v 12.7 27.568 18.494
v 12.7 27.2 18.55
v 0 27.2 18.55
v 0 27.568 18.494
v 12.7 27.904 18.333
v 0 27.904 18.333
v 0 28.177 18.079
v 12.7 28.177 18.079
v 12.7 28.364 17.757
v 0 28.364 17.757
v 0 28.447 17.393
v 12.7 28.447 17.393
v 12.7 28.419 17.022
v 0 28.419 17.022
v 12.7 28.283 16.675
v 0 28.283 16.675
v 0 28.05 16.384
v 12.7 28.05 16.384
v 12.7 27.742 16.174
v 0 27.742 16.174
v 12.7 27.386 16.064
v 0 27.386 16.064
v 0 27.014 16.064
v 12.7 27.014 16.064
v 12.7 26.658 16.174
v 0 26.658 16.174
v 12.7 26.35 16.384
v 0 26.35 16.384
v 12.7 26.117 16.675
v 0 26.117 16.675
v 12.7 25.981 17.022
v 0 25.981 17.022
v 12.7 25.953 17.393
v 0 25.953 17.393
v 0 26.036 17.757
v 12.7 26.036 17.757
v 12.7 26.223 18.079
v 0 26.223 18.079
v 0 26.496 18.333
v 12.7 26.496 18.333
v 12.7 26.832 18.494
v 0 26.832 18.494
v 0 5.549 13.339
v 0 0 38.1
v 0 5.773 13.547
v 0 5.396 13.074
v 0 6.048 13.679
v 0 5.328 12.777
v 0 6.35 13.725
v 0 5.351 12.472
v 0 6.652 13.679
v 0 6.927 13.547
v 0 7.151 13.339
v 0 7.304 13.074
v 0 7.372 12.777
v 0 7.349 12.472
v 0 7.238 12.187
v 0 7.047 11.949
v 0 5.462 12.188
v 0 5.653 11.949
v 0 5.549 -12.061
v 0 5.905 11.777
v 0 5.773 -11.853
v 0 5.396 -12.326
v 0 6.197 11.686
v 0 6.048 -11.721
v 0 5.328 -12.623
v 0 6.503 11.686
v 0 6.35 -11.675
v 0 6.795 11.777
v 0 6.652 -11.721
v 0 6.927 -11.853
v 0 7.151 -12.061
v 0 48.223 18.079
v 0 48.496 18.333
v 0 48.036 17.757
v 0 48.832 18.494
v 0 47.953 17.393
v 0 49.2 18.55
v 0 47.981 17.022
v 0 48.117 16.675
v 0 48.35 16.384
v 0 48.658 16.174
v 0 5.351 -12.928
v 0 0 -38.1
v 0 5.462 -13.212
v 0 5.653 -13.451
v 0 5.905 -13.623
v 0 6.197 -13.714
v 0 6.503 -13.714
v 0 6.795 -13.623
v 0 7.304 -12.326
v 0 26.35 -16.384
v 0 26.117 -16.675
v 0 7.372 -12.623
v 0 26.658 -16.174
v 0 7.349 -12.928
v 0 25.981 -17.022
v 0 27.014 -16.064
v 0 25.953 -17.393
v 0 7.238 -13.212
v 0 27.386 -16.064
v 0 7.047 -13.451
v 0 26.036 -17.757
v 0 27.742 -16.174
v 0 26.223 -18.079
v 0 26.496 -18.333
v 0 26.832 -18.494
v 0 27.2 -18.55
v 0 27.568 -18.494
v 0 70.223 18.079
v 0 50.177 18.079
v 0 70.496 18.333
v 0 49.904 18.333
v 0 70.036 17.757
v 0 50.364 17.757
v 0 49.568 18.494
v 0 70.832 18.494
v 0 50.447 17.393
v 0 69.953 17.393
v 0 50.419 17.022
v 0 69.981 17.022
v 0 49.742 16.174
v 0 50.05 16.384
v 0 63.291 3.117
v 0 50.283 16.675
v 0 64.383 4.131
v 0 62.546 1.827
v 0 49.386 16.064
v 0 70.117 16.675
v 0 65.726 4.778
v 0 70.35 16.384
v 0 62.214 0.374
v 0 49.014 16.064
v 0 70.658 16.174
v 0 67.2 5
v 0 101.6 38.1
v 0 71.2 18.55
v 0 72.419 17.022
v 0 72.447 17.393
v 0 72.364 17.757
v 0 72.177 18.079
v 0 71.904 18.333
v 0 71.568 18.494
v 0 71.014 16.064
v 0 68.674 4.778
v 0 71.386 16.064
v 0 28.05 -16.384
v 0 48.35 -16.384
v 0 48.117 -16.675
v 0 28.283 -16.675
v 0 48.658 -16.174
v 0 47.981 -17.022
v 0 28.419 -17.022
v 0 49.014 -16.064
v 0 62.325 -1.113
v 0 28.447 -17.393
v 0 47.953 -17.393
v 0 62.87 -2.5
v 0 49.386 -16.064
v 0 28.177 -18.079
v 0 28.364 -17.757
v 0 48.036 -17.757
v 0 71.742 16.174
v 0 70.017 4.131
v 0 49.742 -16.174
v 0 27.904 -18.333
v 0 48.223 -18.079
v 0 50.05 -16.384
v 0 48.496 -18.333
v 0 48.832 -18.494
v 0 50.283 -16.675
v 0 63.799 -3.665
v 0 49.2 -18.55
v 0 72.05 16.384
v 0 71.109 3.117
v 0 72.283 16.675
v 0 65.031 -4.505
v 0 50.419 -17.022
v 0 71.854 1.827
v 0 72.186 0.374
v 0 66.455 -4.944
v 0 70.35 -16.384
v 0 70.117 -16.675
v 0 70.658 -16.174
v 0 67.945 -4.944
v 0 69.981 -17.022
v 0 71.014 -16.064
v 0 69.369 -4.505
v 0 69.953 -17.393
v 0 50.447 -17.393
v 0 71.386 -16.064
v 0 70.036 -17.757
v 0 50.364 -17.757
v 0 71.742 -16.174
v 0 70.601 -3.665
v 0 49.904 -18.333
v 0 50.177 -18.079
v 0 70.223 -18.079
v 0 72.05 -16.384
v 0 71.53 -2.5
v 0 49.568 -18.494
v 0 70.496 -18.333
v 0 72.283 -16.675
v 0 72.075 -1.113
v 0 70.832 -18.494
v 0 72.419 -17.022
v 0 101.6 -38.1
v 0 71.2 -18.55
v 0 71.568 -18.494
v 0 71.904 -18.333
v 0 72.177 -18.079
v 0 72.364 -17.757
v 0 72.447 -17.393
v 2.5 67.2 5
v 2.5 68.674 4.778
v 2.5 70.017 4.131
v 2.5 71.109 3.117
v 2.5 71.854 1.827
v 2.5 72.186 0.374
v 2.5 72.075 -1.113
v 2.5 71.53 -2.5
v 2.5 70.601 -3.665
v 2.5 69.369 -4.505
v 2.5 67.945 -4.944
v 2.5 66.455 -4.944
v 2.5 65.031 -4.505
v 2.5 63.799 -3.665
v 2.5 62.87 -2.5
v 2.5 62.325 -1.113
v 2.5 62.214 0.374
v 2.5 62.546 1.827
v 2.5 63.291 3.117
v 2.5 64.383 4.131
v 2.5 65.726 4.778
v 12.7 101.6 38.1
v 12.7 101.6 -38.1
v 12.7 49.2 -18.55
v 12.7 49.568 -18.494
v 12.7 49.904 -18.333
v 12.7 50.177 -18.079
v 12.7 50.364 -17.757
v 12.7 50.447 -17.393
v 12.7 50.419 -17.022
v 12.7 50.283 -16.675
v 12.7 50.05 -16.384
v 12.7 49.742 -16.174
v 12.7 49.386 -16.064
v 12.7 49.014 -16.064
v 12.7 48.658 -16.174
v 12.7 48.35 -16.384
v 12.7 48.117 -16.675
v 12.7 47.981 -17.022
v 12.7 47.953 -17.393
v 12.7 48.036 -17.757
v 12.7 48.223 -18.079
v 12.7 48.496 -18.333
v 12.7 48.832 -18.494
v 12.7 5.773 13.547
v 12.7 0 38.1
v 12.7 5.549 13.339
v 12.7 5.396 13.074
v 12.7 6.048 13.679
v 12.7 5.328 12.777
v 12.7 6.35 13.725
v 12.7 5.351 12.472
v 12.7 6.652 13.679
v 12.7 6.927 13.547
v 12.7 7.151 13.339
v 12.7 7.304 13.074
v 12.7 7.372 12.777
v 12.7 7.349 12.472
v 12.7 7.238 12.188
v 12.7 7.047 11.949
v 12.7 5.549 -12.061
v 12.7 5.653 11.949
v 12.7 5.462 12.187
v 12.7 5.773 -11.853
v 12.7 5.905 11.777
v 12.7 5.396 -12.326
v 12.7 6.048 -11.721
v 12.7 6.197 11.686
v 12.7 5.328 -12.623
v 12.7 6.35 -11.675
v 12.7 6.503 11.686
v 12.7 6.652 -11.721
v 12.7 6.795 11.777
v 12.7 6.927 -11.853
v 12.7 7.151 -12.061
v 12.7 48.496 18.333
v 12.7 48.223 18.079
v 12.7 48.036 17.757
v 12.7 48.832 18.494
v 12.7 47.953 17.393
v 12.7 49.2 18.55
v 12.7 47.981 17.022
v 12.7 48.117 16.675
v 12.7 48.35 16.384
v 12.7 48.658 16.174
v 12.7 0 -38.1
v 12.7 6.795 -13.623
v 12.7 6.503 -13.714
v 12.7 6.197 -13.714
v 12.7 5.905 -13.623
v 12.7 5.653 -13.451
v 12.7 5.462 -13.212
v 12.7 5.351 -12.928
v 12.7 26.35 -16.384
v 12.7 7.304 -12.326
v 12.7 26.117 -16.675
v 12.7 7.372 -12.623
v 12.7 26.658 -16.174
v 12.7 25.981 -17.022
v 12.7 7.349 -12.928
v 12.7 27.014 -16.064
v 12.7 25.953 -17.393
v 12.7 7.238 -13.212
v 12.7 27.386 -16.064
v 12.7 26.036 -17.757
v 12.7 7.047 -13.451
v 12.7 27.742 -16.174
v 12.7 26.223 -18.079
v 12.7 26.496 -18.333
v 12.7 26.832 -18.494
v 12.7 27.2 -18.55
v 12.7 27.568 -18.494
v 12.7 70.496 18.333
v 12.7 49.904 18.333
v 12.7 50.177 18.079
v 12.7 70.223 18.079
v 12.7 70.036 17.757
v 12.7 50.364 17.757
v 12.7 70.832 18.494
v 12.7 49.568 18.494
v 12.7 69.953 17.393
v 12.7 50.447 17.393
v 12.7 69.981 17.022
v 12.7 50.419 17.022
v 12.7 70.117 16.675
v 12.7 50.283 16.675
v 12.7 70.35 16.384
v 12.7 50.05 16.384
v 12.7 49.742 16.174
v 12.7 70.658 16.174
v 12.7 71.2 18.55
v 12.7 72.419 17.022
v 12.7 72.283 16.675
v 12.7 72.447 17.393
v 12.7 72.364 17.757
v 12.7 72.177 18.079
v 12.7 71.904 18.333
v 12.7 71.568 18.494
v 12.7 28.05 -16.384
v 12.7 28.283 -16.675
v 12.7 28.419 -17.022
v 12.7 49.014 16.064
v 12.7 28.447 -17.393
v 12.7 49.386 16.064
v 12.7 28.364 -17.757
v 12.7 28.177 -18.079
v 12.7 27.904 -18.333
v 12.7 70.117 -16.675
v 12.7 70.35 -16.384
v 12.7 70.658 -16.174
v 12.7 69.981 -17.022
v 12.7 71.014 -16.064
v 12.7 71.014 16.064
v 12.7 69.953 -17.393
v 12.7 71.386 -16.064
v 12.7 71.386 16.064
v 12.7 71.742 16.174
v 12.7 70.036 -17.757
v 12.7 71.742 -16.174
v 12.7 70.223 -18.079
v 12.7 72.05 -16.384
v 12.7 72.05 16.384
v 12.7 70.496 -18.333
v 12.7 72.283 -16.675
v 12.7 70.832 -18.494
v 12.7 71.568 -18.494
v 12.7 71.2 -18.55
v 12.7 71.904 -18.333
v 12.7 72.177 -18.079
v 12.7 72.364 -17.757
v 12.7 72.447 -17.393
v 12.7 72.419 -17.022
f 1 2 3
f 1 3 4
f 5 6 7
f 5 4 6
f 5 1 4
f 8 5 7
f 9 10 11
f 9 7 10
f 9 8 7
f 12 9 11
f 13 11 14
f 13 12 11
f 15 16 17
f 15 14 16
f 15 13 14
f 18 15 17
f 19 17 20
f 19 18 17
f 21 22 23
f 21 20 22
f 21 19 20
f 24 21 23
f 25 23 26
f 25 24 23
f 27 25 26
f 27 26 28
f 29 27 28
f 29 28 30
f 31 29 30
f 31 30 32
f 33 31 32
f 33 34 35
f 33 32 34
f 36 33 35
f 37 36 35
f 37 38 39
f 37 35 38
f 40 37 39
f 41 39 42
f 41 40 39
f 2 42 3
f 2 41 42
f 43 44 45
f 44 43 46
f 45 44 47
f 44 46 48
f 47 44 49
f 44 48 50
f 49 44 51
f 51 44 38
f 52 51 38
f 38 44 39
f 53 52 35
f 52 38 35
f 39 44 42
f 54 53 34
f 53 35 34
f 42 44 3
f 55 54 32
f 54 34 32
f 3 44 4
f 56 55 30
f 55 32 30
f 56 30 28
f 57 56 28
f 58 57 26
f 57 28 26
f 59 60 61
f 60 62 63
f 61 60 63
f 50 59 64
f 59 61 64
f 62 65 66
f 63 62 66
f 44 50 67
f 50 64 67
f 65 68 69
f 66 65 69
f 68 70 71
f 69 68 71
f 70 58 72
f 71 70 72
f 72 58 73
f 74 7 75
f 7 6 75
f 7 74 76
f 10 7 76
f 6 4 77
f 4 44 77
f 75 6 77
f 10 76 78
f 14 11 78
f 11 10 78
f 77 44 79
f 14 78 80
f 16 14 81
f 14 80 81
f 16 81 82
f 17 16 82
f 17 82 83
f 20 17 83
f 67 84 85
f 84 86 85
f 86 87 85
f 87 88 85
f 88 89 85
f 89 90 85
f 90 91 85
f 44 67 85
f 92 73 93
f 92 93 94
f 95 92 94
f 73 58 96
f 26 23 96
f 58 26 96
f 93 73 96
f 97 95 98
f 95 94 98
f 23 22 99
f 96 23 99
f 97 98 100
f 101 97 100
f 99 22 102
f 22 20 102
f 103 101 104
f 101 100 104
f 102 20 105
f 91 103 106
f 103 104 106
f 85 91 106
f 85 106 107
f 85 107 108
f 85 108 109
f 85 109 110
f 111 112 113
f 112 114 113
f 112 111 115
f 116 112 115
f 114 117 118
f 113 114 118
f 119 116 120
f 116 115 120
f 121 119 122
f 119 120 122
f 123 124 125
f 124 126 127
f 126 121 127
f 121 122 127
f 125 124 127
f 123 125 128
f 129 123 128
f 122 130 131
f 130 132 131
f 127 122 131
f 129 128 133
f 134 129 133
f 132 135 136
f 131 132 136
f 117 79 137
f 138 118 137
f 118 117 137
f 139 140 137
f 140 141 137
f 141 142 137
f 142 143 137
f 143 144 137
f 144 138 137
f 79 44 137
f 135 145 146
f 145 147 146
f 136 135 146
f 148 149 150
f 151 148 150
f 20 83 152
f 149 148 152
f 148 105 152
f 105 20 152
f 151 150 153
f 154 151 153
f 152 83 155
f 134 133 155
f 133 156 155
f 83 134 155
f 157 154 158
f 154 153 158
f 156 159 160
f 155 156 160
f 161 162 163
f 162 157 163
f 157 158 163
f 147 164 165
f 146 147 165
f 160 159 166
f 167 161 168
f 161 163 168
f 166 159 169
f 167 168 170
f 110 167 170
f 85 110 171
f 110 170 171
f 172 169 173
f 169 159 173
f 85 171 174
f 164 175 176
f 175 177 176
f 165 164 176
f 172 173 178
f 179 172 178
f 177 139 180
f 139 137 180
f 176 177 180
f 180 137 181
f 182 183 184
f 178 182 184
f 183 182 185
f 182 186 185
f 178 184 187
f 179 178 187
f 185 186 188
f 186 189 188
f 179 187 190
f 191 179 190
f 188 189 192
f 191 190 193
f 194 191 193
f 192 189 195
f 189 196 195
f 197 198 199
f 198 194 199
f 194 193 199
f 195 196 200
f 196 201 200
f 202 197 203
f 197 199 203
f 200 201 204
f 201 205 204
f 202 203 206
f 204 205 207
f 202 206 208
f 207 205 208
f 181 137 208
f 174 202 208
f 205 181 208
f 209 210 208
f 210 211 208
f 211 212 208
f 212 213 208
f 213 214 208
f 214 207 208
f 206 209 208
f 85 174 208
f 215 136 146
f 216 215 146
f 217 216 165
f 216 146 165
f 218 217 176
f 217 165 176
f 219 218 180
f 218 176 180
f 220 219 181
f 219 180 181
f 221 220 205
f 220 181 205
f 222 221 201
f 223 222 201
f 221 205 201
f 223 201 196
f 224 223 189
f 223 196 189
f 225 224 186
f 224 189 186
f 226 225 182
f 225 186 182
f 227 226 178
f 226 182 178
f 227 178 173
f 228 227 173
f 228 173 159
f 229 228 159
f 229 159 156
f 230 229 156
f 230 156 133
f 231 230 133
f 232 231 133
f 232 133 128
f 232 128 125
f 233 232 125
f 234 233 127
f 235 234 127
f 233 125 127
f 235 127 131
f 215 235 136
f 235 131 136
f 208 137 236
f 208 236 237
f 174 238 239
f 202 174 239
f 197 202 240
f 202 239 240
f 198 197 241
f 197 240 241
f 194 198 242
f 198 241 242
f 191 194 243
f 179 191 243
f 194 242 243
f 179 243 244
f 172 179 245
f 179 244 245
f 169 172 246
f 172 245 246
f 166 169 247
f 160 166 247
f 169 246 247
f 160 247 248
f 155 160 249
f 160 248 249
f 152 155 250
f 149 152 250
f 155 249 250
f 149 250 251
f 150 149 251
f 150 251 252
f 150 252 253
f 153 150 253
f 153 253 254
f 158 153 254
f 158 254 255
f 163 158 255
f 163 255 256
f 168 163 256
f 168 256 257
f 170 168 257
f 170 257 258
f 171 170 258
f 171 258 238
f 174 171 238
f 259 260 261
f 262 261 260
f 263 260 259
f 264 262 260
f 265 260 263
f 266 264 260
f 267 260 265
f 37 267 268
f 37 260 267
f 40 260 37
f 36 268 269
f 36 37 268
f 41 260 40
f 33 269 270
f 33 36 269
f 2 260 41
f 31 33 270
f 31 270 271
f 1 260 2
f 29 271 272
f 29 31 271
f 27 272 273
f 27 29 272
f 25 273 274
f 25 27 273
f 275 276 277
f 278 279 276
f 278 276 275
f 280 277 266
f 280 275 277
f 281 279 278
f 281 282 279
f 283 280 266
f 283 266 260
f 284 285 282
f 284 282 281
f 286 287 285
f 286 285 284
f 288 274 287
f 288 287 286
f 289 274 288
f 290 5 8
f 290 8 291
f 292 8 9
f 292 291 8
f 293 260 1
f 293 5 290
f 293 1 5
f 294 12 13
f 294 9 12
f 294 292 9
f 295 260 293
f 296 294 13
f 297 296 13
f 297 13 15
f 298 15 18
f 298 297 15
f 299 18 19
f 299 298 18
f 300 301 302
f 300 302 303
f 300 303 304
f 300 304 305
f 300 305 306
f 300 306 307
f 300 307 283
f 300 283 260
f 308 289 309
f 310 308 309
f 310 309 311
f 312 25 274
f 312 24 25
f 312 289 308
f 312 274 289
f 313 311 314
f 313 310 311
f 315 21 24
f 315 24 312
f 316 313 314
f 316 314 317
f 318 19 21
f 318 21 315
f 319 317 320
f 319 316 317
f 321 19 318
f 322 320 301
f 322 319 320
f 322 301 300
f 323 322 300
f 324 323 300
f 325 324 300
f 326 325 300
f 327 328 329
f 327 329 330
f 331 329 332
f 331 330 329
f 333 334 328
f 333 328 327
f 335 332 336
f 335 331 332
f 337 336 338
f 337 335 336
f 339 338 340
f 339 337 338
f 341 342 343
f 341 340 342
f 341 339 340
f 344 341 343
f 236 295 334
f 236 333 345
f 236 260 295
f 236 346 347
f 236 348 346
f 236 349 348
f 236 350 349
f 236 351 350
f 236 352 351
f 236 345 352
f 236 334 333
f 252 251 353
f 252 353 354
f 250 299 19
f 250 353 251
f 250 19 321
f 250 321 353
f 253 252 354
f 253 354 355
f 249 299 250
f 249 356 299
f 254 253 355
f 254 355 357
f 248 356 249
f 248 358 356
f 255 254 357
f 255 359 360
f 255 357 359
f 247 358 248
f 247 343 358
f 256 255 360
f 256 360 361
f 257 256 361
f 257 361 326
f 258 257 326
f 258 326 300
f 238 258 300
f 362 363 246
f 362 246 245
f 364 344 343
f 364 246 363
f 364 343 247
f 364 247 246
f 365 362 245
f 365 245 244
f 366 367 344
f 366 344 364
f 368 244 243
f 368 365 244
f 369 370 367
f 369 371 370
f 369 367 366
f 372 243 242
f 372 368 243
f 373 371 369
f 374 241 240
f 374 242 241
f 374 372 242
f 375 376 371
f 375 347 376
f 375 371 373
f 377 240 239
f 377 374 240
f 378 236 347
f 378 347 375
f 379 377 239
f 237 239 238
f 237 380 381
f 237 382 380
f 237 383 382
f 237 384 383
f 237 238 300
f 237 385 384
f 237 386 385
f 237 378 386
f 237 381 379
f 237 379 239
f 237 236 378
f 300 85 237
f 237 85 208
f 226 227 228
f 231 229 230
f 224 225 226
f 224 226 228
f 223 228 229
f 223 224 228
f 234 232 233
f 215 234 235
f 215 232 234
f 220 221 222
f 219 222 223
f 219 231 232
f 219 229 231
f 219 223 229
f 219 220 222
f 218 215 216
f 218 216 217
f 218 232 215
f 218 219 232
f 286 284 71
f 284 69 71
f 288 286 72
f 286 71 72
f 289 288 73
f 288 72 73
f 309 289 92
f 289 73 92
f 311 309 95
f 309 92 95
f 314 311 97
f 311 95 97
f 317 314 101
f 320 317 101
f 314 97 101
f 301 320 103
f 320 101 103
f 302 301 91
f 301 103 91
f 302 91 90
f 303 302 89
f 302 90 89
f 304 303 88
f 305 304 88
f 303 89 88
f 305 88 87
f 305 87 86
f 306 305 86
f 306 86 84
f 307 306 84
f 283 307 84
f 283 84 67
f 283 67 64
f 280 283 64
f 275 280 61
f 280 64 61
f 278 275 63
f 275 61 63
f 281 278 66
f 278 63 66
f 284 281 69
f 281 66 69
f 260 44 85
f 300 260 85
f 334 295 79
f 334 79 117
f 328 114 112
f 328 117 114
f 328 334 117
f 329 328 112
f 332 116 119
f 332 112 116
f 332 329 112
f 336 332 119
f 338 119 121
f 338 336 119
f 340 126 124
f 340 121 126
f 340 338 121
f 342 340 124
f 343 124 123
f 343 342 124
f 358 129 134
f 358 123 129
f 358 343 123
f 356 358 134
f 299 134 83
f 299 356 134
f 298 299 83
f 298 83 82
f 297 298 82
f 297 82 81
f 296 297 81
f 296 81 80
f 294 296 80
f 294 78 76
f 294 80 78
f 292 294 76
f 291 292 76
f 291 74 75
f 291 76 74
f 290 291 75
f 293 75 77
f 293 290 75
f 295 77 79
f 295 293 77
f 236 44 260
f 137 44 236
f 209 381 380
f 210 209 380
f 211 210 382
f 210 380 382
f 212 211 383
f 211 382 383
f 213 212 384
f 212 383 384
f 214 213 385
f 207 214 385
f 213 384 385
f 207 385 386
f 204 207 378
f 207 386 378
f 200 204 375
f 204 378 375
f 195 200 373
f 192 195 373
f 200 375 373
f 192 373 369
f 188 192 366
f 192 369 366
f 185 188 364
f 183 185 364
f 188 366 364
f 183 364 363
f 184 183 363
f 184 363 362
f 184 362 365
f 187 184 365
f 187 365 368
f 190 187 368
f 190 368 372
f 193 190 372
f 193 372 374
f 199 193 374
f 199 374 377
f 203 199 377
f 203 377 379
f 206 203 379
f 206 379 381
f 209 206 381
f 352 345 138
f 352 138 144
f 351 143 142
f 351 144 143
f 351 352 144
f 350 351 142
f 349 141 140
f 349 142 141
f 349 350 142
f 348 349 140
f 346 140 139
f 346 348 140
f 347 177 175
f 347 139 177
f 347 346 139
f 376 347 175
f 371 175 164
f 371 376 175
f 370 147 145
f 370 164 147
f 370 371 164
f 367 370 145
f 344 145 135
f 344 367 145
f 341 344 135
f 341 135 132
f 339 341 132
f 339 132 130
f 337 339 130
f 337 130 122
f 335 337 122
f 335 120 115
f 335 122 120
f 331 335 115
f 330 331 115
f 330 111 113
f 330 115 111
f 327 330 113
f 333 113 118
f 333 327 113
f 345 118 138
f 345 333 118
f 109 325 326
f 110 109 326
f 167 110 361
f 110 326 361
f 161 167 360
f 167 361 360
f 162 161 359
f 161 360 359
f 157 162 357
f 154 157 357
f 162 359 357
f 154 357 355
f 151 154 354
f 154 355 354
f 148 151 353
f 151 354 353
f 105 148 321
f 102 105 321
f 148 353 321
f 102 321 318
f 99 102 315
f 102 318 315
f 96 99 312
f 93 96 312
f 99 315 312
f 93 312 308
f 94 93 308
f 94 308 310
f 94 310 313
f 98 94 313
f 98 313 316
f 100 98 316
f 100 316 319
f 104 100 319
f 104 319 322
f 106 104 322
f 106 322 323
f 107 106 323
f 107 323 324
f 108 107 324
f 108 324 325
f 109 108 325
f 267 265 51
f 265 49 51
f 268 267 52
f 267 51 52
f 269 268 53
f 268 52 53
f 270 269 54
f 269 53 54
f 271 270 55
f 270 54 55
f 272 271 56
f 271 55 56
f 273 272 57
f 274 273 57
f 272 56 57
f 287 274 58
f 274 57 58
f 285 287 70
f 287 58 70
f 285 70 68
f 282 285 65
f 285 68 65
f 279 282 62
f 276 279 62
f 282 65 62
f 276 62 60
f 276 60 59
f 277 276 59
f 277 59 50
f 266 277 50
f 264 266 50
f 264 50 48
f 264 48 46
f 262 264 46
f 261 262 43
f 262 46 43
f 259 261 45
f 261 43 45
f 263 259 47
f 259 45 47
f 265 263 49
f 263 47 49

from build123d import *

# Parameters (mm, degrees)
SKETCH2_W                          = 76.2
SKETCH2_H                          = 101.6
BOSS_EXTRUDE2_DEPTH                = 12.7
F_2_5MM_DOWEL_HOLE1_D              = 2.5
SKETCH5_R                          = 5
CUT_EXTRUDE1_DEPTH                 = 2.5
TAP_DRILL_FOR_M2_5X0_45_TAP1_D     = 2.05
TAP_DRILL_FOR_M2_5X0_45_TAP1_DEPTH = 12.7
TAP_DRILL_FOR_M2_5X0_45_TAP1_TIP   = 0.615882135


with BuildPart() as part:
    # Sketch2 → Boss-Extrude2 (new body)
    with BuildSketch(Plane(origin=(0, 0, 0), x_dir=(0, 0, -1), z_dir=(1, 0, 0))):
        with Locations((0, 50.8)):
            Rectangle(SKETCH2_W, SKETCH2_H)
    extrude(amount=BOSS_EXTRUDE2_DEPTH)

    # Ø2.5mm Dowel Hole1 (through all)
    with Locations(Plane.ZY):
        with Locations((-17.3, 71.2), (-17.3, 49.2), (-17.3, 27.2)):
            f_2_5mm_dowel_hole1 = Hole(F_2_5MM_DOWEL_HOLE1_D / 2)

    # Mirror1: Ø2.5mm Dowel Hole1 across plane
    add(f_2_5mm_dowel_hole1.mirror(Plane.XY), mode=Mode.SUBTRACT)

    # Sketch5 → Cut-Extrude1 (cut)
    with BuildSketch(Plane.ZY):
        with Locations((0, 67.2)):
            Circle(SKETCH5_R)
    extrude(amount=-CUT_EXTRUDE1_DEPTH, mode=Mode.SUBTRACT)

    # Tap Drill for M2.5x0.45 Tap1
    with Locations(Plane(origin=(12.7, 0, 0), x_dir=(0, 0, -1), z_dir=(1, 0, 0))):
        with Locations((-12.7, 6.35), (12.7, 6.35)):
            Hole(TAP_DRILL_FOR_M2_5X0_45_TAP1_D / 2, depth=TAP_DRILL_FOR_M2_5X0_45_TAP1_DEPTH)
            with Locations((0, 0, -(TAP_DRILL_FOR_M2_5X0_45_TAP1_DEPTH + TAP_DRILL_FOR_M2_5X0_45_TAP1_TIP / 2))):  # 118° drill point
                Cone(0, TAP_DRILL_FOR_M2_5X0_45_TAP1_D / 2, TAP_DRILL_FOR_M2_5X0_45_TAP1_TIP, mode=Mode.SUBTRACT)


solid = part.part
